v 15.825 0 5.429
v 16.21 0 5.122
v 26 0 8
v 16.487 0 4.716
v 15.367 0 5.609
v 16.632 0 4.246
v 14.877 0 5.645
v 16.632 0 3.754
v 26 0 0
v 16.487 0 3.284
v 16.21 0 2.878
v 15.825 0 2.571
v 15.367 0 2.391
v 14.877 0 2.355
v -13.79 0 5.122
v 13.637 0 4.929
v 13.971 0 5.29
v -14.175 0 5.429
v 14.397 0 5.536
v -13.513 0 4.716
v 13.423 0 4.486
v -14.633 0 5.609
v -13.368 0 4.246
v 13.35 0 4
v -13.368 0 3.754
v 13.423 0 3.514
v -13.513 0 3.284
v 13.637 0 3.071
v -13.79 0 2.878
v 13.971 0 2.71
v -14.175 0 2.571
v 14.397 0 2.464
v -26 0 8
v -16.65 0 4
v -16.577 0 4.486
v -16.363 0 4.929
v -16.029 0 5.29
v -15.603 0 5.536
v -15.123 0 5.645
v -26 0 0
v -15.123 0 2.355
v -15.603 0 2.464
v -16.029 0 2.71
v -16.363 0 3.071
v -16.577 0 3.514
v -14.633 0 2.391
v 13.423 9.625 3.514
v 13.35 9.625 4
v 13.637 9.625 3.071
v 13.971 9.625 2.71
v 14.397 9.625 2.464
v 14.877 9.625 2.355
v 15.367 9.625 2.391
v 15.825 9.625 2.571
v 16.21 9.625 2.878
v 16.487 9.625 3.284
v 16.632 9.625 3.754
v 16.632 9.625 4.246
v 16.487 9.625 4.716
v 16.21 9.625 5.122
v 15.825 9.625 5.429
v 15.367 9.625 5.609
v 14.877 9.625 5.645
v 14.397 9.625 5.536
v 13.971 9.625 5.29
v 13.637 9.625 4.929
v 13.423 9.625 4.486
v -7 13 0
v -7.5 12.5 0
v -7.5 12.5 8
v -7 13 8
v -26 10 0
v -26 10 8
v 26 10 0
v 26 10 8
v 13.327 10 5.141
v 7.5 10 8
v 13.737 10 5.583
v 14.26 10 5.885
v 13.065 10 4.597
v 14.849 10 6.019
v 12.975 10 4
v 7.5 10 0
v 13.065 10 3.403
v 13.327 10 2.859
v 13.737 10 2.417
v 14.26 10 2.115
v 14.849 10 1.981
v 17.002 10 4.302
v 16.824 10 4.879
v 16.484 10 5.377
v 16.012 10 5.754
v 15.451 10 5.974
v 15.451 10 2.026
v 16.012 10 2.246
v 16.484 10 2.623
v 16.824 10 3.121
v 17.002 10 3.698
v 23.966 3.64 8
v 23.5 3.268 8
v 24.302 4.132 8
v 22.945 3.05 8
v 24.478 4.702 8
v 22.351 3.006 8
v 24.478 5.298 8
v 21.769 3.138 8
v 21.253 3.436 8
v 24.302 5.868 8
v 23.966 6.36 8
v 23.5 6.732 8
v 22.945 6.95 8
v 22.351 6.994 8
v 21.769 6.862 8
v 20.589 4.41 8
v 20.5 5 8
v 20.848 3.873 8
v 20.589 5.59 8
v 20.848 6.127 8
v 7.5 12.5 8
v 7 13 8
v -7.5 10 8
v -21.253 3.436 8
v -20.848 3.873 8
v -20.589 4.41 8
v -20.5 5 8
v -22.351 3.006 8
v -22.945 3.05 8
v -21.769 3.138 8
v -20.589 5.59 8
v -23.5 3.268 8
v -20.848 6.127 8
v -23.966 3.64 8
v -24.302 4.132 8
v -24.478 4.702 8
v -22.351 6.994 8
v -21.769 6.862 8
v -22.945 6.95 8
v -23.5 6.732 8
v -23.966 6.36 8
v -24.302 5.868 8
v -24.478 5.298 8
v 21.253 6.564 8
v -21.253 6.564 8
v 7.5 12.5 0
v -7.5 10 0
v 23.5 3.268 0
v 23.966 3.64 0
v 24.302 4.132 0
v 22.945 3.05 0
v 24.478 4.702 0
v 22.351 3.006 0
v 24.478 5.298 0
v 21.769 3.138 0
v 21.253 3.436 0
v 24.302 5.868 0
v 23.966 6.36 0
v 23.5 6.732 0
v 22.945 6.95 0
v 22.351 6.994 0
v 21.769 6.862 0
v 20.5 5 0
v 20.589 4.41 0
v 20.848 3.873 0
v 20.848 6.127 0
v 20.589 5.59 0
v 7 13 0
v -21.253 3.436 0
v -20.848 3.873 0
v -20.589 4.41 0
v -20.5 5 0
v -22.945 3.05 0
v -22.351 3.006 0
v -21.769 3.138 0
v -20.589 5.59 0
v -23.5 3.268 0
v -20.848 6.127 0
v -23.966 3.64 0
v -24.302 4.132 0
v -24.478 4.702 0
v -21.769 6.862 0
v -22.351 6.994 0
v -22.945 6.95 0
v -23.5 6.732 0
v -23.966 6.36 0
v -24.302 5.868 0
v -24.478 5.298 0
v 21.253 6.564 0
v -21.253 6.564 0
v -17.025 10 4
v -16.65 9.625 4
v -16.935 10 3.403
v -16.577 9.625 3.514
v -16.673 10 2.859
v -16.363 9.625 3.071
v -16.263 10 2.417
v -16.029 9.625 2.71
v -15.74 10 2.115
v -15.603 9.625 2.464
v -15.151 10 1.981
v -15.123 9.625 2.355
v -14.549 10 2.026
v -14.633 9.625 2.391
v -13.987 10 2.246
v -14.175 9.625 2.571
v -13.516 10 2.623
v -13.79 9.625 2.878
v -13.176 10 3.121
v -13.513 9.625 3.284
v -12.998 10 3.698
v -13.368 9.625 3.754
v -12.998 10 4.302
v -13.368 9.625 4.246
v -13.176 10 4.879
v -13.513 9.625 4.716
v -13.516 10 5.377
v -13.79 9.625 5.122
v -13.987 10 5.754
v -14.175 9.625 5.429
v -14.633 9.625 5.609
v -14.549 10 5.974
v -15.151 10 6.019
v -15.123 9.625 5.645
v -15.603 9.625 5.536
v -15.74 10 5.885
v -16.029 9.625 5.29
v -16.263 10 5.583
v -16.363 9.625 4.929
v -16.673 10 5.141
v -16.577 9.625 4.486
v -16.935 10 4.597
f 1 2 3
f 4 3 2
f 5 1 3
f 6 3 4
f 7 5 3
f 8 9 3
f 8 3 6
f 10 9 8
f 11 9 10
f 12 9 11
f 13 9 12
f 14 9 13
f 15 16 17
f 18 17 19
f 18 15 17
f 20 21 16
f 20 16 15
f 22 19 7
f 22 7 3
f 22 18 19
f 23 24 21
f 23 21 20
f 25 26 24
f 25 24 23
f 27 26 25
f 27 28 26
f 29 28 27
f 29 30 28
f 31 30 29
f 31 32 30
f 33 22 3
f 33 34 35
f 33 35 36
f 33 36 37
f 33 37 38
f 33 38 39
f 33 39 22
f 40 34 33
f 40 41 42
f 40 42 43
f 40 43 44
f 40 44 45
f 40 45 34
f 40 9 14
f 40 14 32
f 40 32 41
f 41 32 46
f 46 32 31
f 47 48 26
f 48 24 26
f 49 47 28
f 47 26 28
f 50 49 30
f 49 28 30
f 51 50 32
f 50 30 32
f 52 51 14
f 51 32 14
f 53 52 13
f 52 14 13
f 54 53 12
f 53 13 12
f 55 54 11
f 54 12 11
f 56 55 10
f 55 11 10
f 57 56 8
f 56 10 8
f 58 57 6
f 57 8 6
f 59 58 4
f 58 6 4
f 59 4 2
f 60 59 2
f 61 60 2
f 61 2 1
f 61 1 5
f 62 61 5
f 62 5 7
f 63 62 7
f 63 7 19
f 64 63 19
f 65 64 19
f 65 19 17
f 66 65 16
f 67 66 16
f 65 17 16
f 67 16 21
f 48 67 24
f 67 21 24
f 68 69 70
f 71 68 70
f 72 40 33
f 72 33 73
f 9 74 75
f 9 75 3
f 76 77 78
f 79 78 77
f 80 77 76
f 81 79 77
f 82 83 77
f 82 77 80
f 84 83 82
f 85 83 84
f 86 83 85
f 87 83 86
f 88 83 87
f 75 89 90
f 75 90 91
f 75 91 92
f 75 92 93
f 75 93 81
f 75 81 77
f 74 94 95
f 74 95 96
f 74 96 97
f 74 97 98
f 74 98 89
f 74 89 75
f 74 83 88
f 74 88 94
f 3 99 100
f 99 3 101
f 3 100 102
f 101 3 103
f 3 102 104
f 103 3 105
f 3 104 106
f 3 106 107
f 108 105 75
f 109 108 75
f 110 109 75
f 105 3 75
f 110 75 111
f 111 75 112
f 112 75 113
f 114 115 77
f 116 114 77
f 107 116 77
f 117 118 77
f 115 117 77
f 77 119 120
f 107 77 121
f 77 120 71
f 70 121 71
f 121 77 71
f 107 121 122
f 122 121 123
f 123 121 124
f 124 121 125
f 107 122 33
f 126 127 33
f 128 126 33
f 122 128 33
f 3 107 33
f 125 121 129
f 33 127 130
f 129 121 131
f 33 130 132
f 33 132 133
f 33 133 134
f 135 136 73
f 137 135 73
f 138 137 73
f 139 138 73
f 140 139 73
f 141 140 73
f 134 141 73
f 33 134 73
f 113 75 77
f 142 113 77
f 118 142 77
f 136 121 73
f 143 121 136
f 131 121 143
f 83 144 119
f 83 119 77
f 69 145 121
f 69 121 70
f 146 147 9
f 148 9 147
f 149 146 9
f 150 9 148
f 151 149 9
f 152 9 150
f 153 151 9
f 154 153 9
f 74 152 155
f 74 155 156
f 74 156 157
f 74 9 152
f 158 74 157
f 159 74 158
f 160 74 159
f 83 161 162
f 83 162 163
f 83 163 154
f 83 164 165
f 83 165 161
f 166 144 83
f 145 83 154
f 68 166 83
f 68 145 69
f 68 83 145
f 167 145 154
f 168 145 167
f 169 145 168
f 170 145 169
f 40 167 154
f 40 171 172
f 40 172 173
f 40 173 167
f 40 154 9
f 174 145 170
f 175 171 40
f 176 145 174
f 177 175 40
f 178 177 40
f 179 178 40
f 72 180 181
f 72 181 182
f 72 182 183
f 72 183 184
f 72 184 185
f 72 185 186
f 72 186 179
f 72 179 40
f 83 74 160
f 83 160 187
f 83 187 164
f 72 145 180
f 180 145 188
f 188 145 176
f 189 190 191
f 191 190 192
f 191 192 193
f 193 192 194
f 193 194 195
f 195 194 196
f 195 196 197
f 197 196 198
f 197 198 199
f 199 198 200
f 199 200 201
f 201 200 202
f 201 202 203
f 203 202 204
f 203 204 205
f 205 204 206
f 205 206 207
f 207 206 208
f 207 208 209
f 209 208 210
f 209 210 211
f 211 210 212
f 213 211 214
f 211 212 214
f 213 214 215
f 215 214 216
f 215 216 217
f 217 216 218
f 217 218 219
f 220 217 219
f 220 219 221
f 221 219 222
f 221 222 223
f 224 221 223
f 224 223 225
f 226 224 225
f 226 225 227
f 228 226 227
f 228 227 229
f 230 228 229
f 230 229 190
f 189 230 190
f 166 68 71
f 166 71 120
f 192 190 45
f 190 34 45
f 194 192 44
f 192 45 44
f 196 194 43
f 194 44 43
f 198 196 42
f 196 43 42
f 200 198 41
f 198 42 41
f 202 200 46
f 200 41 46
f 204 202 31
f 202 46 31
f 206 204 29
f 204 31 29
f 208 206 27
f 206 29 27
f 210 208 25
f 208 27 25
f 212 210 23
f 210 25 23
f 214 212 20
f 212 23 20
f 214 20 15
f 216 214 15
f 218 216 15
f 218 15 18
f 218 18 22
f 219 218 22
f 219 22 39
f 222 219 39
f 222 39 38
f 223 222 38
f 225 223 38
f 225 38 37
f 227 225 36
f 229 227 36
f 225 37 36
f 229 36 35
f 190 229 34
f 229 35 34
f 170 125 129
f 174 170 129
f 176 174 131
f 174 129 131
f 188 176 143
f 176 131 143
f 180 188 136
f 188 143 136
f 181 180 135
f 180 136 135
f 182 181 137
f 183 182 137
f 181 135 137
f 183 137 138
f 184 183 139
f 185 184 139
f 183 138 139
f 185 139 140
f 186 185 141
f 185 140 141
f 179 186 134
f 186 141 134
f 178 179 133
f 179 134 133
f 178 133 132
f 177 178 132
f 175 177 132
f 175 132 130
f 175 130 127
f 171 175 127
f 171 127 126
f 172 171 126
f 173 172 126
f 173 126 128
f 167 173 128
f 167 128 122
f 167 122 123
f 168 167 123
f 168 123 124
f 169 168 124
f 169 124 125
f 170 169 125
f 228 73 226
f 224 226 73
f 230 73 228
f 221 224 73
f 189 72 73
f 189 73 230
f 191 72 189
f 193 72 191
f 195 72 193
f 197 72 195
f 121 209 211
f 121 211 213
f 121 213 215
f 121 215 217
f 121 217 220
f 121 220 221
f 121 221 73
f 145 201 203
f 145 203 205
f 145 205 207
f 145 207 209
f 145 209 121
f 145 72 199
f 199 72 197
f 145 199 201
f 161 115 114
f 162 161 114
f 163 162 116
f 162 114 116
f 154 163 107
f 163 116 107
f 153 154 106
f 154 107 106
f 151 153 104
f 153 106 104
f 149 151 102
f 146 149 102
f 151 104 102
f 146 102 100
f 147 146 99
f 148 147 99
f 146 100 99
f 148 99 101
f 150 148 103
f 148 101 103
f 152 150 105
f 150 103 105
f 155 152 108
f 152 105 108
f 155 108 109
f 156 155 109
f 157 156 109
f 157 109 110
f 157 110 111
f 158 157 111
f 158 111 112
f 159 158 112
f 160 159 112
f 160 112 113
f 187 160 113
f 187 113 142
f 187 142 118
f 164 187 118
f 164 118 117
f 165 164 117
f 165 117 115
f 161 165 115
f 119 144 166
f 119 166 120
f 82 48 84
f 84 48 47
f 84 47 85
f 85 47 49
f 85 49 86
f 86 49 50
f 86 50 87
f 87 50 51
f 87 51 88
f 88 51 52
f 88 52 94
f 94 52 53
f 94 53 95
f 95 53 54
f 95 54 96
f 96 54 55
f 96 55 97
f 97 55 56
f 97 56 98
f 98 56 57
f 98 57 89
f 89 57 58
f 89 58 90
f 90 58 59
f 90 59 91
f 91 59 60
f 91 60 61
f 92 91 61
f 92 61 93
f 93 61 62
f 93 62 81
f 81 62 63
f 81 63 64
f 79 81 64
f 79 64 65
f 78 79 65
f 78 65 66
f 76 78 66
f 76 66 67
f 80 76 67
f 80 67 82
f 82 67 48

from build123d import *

# Parameters (mm, degrees)
EXTRUDE_1_DEPTH              = 8
SKETCH_4_R                   = 2
CUT_EXTRUDE_3_DEPTH          = 31.149626863
HOLE_WIZARD_M4_1_D           = 3.3
HOLE_WIZARD_M4_1_DEPTH       = 10
HOLE_WIZARD_M4_1_CSINK_D     = 4.05
HOLE_WIZARD_M4_1_CSINK_ANGLE = 90
HOLE_WIZARD_M4_1_TIP         = 0.991420021
CHAMFER_1_SIZE               = 0.5


with BuildPart() as part:
    # 草图2 → 凸台-拉伸1 (new body)
    with BuildSketch(Plane.XY):
        Polygon((-7.5, 13), (7.5, 13), (7.5, 10), (26, 10), (26, 0), (-26, 0), (-26, 10), (-7.5, 10), align=None)
    extrude(amount=EXTRUDE_1_DEPTH)

    # 草图4 → 切除-拉伸3 (cut, through all)
    with BuildSketch(Plane.XY.offset(8)):
        with Locations((-22.5, 5)):
            Circle(SKETCH_4_R)
        with Locations(Location((22.5, 5, 0), (0, 0, 180))):
            Circle(SKETCH_4_R)
    extrude(amount=-CUT_EXTRUDE_3_DEPTH, mode=Mode.SUBTRACT)

    # M4 螺纹孔1
    with Locations(Plane(origin=(-15, 10, 4), x_dir=(1, 0, 0), z_dir=(0, 1, 0))):
        with Locations((0, 0), (30, 0)):
            CounterSinkHole(HOLE_WIZARD_M4_1_D / 2, HOLE_WIZARD_M4_1_CSINK_D / 2, depth=HOLE_WIZARD_M4_1_DEPTH, counter_sink_angle=HOLE_WIZARD_M4_1_CSINK_ANGLE)
            with Locations((0, 0, -(HOLE_WIZARD_M4_1_DEPTH + HOLE_WIZARD_M4_1_TIP / 2))):  # 118° drill point
                Cone(0, HOLE_WIZARD_M4_1_D / 2, HOLE_WIZARD_M4_1_TIP, mode=Mode.SUBTRACT)

    # 倒角1
    chamfer_1_edges = [part.edges().sort_by_distance(p)[0] for p in [
        (-7.5, 13, 4),
        (7.5, 13, 4),
    ]]
    chamfer(chamfer_1_edges, length=CHAMFER_1_SIZE)


solid = part.part
